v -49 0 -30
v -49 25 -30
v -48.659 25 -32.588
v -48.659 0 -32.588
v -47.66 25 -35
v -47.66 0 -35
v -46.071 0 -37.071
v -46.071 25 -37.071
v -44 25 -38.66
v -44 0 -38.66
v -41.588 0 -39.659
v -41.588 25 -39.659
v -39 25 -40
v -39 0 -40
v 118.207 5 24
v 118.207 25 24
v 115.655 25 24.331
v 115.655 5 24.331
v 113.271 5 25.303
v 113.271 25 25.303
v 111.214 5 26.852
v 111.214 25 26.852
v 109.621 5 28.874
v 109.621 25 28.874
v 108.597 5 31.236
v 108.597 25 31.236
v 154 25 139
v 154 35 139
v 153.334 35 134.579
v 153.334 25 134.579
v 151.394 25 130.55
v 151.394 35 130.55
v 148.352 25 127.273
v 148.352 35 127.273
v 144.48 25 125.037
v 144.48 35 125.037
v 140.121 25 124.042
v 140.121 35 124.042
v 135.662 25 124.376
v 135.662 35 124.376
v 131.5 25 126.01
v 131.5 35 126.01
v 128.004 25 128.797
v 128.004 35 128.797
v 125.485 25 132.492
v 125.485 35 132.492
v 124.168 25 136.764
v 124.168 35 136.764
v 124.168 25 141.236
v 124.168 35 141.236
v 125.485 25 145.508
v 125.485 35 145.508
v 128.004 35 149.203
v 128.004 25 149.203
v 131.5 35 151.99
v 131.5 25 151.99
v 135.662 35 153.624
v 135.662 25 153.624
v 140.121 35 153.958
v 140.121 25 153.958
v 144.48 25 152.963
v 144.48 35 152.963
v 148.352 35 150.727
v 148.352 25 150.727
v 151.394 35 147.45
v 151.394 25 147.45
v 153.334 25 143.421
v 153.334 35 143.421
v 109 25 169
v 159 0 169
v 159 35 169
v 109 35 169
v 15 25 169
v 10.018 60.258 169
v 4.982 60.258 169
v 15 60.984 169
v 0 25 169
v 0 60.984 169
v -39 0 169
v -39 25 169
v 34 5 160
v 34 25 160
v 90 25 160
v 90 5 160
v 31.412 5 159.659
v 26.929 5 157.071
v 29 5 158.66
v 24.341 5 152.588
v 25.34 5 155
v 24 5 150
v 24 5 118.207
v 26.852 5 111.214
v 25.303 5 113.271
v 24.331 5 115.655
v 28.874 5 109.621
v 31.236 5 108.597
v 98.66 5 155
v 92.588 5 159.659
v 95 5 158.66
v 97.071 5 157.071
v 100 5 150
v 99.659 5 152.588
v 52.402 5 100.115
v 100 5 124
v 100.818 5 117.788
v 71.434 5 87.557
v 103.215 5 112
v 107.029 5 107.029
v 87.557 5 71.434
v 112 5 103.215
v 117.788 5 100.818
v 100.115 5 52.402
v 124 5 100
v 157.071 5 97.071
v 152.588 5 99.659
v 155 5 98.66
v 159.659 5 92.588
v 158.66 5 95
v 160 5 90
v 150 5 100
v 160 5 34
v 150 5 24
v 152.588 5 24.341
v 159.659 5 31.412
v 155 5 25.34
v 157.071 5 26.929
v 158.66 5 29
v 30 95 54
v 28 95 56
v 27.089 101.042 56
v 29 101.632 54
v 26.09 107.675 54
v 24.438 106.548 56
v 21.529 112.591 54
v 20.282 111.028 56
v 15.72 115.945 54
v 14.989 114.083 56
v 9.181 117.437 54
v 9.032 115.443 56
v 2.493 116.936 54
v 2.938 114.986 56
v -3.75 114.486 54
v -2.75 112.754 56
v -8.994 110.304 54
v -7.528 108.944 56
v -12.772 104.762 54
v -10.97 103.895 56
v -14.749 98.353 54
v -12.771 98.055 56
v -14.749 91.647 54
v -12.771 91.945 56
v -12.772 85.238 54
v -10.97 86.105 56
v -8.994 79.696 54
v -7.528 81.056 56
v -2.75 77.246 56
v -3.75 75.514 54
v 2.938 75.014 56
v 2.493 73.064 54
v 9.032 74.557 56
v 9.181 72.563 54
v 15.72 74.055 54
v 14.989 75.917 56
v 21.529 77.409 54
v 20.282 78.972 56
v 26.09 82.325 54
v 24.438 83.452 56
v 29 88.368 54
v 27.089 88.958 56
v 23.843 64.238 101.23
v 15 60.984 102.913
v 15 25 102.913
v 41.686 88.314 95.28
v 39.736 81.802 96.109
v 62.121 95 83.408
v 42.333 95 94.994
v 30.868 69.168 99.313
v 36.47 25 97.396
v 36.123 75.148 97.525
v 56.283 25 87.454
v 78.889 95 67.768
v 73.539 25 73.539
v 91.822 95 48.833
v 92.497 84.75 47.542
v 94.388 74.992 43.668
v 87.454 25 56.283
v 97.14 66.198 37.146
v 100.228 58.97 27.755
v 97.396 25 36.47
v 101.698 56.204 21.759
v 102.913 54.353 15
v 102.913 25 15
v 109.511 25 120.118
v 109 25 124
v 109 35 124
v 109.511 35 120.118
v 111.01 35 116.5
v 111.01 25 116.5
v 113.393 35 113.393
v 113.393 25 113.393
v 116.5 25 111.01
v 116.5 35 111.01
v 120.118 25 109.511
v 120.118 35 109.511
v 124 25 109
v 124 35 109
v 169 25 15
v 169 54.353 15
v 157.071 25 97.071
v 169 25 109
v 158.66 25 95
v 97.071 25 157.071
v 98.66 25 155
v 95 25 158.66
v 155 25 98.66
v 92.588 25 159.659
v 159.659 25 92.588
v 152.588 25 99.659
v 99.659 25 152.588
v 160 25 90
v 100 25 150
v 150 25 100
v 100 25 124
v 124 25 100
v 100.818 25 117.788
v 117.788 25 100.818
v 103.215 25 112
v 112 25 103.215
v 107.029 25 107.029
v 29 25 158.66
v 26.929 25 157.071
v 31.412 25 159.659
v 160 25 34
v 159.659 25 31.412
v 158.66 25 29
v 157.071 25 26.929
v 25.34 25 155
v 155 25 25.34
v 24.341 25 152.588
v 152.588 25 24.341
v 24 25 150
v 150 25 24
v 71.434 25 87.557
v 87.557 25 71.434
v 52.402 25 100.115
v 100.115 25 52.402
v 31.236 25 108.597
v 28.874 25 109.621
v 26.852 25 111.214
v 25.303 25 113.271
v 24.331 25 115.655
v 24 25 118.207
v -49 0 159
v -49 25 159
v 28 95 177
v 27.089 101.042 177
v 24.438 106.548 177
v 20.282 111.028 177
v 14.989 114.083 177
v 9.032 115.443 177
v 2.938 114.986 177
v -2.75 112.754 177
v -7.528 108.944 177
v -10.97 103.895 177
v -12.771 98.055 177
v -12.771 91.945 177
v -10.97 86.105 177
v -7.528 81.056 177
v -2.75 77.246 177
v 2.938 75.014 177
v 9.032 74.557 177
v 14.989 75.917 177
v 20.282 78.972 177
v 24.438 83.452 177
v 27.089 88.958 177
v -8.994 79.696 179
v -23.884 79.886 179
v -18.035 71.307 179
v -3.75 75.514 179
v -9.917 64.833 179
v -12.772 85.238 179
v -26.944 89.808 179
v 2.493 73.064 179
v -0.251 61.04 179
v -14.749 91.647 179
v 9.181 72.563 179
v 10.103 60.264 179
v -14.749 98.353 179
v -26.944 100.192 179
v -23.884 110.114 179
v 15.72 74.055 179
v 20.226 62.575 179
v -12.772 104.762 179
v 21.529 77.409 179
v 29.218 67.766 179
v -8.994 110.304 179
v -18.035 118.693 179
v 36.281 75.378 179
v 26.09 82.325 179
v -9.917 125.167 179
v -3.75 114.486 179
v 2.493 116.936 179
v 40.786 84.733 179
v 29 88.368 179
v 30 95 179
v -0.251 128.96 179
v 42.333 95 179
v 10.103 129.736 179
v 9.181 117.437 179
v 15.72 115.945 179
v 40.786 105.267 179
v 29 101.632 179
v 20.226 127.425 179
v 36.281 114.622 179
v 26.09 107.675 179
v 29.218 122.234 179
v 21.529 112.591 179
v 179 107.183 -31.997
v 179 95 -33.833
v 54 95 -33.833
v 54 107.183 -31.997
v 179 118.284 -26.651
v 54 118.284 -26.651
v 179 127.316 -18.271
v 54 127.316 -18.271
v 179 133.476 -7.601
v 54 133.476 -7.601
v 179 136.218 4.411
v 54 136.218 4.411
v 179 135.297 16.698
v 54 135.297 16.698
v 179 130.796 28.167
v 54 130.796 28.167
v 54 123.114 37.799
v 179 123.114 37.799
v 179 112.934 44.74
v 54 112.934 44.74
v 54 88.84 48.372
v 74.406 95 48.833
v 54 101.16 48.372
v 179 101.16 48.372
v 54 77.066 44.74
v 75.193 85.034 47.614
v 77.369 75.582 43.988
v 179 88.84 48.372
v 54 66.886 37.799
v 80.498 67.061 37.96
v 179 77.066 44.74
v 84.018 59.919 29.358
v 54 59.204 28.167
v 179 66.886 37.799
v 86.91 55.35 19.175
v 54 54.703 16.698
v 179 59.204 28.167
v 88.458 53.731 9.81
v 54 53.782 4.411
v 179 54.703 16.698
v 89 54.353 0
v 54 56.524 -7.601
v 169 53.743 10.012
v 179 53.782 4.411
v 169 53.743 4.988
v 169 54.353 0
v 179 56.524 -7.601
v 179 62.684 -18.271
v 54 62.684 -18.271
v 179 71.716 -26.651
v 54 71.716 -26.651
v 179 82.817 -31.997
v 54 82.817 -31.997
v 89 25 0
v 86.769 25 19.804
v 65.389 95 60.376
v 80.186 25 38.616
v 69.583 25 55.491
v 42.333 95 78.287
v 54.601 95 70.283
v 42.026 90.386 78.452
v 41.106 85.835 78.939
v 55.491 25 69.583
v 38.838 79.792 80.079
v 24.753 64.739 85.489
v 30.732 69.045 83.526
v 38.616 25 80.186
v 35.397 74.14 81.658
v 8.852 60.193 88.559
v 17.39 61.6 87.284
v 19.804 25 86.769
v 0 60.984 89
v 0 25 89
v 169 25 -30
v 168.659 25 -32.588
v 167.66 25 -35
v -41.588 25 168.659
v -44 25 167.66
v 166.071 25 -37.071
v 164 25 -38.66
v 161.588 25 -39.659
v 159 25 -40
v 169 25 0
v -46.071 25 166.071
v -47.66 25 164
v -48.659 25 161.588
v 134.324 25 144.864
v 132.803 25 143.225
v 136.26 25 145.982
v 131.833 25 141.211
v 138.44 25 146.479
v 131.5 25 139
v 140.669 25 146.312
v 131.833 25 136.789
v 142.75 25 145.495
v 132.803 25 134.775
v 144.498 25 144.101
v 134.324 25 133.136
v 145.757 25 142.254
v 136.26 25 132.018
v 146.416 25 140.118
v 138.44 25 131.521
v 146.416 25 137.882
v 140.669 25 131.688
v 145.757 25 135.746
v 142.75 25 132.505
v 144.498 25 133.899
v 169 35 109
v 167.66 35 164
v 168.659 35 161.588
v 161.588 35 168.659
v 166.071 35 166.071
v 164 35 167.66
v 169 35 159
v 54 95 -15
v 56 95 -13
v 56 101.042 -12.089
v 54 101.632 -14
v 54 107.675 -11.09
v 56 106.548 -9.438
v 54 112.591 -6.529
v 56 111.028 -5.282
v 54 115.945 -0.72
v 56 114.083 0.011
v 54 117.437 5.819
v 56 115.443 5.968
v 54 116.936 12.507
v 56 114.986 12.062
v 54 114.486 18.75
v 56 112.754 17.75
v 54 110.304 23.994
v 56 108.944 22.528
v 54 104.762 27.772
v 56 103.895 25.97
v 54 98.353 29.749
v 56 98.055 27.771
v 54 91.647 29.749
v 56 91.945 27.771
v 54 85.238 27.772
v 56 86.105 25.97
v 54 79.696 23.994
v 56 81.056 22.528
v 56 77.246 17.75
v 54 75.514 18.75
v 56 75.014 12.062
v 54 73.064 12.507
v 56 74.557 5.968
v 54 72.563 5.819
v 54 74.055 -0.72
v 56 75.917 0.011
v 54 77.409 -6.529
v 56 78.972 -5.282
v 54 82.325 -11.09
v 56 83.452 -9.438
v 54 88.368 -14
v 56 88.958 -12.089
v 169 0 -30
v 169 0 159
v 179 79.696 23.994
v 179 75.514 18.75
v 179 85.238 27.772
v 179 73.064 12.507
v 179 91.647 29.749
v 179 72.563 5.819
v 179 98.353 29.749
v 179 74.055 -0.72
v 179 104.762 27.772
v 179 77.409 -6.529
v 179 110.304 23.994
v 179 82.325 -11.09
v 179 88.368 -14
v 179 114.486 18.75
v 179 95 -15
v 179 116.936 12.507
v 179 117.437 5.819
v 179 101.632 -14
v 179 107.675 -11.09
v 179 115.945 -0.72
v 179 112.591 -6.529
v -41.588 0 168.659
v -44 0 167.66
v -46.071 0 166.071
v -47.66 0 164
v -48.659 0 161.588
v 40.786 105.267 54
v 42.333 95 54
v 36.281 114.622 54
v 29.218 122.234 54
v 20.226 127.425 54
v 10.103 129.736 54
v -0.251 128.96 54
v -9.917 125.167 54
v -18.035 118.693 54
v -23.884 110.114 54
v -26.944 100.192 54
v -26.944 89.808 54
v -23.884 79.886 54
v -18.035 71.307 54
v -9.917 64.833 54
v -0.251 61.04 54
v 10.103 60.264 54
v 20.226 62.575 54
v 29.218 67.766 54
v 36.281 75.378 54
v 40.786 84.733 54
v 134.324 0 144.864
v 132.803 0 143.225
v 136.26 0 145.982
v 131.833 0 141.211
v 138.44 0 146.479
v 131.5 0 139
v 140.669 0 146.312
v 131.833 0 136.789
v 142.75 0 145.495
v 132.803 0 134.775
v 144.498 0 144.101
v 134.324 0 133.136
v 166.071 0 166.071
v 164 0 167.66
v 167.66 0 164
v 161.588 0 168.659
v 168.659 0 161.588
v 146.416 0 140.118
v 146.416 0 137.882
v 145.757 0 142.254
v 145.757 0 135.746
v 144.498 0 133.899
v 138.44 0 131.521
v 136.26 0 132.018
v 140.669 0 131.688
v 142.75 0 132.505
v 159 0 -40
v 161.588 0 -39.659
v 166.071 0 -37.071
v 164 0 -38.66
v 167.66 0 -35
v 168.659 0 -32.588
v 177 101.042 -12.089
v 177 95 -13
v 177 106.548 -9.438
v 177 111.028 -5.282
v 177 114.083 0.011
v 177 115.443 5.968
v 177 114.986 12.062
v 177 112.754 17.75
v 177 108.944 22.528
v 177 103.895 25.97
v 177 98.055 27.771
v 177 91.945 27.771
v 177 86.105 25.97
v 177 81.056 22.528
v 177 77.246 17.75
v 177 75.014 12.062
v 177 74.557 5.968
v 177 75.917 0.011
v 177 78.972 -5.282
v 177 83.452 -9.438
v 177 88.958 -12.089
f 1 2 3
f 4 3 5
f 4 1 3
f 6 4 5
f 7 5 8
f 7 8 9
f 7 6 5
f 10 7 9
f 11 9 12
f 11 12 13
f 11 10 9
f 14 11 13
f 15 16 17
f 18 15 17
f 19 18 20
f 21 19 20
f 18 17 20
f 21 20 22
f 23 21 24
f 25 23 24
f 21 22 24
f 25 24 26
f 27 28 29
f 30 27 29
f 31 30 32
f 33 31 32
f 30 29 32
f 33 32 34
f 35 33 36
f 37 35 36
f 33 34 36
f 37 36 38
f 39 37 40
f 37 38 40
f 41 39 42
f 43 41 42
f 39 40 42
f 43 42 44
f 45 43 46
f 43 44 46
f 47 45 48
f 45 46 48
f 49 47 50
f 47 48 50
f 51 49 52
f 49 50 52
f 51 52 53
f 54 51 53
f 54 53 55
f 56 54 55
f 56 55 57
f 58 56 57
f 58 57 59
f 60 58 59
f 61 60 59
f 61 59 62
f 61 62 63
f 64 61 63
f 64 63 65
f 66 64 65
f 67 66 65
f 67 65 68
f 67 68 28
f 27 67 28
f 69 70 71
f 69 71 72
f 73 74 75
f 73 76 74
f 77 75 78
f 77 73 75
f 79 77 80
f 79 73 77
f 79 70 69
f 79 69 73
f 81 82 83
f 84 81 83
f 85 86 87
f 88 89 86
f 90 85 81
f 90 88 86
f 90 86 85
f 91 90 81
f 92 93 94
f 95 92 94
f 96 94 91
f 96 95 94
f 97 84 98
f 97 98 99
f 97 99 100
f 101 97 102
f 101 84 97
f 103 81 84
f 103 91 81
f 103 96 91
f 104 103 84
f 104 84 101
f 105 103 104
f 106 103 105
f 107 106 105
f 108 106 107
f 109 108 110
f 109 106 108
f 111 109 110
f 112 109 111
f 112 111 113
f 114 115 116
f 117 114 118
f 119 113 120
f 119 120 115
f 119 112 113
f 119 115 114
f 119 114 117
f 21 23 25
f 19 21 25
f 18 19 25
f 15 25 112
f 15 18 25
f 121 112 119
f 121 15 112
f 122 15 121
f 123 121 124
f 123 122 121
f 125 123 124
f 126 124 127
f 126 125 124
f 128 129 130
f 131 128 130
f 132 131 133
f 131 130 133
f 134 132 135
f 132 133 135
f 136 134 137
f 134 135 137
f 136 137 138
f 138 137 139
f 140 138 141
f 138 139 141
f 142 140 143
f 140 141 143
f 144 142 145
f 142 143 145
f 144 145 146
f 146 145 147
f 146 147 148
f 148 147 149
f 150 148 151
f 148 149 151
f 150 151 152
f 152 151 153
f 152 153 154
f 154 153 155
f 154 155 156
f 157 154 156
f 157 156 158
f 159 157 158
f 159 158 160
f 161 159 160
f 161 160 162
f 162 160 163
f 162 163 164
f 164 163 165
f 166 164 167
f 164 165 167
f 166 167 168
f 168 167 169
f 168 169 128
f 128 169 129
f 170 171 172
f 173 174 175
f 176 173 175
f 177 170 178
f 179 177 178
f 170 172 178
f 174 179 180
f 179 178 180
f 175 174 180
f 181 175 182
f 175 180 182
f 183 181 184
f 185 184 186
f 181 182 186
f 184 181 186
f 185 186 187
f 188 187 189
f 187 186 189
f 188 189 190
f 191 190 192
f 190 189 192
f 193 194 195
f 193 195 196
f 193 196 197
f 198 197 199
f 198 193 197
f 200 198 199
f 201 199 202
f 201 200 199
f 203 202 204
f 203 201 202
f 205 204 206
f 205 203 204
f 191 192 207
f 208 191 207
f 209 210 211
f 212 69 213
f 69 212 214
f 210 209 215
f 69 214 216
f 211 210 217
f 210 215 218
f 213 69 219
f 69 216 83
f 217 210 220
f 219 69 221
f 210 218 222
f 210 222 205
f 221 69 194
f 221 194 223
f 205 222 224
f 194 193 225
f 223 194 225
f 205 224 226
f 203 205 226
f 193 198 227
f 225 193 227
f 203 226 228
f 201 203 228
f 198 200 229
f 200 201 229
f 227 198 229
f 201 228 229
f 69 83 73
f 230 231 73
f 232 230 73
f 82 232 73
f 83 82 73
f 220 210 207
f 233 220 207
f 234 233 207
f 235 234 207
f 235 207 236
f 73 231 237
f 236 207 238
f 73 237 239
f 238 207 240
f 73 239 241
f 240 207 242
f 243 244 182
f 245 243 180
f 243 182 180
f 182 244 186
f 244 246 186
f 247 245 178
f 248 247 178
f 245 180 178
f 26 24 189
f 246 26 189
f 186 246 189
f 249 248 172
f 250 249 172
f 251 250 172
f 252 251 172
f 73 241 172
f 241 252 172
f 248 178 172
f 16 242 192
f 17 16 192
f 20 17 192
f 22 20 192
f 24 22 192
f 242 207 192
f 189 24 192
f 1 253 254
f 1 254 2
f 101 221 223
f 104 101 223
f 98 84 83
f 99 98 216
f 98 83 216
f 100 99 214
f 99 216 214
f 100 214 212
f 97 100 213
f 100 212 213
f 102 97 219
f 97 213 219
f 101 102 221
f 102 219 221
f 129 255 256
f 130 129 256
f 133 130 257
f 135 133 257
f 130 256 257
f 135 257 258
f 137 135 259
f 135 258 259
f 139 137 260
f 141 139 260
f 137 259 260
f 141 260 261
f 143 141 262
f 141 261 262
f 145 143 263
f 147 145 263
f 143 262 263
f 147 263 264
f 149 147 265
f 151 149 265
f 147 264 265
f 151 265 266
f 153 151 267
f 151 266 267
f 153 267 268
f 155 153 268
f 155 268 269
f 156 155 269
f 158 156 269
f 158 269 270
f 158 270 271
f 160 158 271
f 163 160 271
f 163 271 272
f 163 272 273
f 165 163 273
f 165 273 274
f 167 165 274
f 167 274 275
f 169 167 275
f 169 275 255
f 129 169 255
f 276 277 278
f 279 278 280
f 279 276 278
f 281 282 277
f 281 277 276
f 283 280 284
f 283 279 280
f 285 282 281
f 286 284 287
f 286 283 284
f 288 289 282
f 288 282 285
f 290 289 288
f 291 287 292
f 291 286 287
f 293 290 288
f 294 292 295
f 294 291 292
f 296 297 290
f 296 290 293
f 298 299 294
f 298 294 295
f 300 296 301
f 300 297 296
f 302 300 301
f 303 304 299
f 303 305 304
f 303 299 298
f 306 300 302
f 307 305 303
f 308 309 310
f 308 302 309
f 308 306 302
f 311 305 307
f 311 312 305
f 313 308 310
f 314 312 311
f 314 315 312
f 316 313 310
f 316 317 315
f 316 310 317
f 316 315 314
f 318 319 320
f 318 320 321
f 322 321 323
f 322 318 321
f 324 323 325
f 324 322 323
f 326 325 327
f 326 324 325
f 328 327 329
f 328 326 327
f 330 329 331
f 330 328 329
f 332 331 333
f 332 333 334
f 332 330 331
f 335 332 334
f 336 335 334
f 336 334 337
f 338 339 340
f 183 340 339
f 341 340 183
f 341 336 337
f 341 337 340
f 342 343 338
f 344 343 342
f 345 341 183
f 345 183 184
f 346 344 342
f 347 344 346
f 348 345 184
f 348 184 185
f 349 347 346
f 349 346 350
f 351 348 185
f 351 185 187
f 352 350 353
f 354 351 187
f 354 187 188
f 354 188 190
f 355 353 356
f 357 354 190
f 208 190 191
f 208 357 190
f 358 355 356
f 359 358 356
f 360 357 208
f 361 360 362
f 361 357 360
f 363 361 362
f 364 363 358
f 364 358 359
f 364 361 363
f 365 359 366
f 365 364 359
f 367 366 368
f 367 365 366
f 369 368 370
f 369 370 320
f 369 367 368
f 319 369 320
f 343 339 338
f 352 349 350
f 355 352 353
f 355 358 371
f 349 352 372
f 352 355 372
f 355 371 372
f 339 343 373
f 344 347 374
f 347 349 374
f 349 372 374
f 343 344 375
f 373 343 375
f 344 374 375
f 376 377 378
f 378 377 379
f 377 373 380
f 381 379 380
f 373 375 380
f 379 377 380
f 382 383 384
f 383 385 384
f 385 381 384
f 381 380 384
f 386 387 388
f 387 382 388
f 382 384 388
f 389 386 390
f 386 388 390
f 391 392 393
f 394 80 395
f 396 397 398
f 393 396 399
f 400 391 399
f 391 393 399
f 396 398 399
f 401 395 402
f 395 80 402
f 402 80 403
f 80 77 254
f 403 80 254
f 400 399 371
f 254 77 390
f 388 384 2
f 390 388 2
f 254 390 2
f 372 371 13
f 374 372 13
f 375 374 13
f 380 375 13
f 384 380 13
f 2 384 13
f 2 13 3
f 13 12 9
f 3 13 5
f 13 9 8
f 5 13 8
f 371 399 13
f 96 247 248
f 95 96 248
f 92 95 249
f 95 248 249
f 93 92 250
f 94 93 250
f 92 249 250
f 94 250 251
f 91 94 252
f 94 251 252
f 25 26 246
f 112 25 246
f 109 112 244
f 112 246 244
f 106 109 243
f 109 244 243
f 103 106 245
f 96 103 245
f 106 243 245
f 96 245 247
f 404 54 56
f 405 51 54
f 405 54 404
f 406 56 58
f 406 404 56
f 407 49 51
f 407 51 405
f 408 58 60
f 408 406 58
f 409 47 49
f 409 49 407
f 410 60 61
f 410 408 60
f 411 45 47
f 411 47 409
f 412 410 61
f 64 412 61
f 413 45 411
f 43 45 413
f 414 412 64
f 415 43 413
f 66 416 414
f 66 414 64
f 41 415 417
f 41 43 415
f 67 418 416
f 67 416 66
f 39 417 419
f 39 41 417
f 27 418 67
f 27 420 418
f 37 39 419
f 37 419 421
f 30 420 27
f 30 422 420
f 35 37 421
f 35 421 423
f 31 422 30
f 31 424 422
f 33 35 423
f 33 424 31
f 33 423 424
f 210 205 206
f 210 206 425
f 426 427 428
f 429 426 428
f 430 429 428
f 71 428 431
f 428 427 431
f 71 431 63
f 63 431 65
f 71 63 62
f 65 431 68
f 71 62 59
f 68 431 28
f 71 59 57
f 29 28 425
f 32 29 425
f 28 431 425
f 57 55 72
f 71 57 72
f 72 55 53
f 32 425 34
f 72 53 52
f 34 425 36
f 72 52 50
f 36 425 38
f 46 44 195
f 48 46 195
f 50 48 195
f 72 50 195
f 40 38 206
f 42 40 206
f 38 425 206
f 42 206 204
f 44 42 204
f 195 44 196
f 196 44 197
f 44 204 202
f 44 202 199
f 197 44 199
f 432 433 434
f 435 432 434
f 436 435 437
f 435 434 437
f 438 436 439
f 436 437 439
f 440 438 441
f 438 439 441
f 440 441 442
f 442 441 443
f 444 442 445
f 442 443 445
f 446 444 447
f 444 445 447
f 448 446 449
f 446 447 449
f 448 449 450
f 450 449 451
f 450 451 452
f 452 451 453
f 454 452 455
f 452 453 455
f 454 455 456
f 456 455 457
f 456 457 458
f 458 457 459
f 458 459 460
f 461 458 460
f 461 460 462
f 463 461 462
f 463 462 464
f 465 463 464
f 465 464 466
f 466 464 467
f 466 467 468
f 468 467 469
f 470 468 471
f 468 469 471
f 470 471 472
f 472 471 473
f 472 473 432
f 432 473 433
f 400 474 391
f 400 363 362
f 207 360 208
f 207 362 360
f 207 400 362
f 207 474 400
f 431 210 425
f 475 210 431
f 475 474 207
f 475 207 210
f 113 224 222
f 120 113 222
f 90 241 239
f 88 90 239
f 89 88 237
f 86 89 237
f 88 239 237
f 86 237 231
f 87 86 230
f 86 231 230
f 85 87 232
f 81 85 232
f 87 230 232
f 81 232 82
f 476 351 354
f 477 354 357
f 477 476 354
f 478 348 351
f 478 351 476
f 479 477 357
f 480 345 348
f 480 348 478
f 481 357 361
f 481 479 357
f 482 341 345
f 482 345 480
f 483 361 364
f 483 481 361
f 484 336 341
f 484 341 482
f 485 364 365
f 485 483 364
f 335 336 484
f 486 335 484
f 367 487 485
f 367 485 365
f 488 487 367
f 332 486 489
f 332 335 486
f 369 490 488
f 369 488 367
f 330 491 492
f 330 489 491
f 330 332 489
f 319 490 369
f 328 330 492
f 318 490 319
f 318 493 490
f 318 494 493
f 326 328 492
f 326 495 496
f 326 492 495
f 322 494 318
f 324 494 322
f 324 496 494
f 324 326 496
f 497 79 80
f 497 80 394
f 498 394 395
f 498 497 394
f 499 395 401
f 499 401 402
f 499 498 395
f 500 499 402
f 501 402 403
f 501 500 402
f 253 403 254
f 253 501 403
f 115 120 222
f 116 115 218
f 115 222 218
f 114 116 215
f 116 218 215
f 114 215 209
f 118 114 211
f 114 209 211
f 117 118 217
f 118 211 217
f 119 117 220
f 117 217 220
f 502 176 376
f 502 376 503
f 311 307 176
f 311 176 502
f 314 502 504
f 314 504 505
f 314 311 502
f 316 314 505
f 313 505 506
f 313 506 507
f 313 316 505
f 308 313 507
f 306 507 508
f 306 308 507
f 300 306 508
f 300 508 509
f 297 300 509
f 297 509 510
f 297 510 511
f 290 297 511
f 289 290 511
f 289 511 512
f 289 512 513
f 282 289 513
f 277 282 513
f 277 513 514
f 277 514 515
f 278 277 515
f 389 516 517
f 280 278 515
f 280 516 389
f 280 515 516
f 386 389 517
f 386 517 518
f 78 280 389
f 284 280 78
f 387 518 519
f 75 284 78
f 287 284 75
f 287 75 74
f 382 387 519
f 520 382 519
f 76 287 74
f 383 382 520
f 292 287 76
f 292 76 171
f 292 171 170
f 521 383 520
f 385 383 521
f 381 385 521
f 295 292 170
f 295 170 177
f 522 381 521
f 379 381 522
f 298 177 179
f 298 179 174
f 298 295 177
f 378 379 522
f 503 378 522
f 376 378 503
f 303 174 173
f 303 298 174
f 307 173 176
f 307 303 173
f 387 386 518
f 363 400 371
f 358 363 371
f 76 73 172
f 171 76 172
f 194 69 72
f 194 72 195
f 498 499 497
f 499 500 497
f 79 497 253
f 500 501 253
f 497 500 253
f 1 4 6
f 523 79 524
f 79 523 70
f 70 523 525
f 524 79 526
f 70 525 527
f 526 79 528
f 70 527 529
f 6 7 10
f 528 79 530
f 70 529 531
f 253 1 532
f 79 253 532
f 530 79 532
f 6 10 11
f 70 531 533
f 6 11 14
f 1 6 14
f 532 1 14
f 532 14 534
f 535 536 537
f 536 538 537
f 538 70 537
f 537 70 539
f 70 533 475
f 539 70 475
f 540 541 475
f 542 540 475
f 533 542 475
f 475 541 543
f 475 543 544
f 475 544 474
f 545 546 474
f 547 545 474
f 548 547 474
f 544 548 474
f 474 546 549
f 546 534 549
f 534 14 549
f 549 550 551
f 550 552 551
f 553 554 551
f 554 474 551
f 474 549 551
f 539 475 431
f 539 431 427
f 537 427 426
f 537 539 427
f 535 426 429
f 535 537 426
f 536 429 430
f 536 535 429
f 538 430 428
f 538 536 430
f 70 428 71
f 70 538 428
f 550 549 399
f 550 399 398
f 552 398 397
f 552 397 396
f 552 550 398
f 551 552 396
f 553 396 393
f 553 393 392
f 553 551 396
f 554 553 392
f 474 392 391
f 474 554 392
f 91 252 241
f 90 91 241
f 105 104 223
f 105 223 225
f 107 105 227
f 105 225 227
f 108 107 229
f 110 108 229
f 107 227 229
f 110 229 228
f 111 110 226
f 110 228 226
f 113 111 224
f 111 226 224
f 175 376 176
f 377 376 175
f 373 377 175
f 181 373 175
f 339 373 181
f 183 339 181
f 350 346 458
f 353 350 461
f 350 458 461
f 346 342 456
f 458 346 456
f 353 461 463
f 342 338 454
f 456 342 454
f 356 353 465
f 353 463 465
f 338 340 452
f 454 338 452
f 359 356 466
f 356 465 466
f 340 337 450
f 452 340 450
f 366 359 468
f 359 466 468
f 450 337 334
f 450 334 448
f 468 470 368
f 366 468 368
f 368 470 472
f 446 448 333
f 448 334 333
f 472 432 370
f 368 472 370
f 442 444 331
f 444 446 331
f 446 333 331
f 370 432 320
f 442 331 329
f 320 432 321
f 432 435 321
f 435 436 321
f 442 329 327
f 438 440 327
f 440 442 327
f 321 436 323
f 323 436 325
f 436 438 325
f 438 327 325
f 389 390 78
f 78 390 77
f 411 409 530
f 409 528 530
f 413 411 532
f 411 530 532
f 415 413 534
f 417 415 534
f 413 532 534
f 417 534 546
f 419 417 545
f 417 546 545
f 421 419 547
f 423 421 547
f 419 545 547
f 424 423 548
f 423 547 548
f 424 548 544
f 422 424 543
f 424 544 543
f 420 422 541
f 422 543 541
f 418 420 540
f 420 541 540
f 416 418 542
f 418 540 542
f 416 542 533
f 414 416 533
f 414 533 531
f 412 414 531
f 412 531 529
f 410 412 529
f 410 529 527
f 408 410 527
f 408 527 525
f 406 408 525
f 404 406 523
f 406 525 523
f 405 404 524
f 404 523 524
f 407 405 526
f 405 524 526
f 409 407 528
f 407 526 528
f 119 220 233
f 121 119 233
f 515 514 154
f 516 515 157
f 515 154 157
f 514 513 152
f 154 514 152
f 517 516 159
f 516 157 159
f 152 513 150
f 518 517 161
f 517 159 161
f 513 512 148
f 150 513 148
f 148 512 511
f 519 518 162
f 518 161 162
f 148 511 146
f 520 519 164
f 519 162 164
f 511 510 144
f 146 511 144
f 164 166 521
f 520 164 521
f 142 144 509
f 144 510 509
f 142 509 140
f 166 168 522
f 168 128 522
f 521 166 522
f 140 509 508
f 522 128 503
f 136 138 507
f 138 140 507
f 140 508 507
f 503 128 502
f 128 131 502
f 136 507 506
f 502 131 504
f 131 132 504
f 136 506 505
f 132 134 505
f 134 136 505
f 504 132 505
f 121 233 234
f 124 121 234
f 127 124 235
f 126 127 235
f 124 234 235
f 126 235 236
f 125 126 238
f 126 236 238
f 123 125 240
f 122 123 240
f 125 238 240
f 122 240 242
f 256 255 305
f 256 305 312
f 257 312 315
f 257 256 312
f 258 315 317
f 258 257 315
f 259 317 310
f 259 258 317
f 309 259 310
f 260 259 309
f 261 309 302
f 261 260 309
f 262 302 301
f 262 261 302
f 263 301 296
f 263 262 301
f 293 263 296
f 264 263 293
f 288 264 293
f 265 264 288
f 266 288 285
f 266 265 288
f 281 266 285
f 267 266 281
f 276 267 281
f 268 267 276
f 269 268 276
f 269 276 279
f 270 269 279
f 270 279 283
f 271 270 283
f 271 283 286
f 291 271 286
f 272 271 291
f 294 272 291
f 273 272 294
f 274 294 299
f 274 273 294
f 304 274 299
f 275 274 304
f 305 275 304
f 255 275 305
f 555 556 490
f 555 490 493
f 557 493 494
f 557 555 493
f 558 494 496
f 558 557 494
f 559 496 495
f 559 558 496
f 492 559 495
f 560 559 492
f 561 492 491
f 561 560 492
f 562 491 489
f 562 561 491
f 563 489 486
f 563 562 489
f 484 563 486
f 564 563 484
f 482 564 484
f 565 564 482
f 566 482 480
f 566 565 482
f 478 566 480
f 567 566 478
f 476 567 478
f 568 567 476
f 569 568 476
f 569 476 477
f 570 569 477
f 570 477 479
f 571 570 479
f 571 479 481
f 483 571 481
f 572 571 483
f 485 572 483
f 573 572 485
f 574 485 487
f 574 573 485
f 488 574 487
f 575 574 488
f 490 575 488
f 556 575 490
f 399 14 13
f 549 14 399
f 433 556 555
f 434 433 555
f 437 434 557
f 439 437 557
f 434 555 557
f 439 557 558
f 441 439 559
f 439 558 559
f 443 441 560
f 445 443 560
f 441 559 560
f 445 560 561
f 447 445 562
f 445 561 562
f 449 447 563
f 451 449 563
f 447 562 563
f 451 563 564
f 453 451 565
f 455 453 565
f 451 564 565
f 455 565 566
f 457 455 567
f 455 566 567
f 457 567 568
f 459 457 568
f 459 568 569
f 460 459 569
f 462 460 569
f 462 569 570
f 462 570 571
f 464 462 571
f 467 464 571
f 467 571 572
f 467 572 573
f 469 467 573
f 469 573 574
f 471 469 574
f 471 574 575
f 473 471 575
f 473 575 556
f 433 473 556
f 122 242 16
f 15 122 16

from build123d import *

# Parameters (mm, degrees)
BOSS_EXTRUDE1_DEPTH                     = 25
BOSS_EXTRUDE2_START                     = -25
BOSS_EXTRUDE2_DEPTH                     = 95
BOSS_EXTRUDE3_DEPTH                     = 10
CBORE_FOR_M8_HEX_HEAD_BOLT1_D           = 15
CBORE_FOR_M8_HEX_HEAD_BOLT1_CBORE_D     = 30
CBORE_FOR_M8_HEX_HEAD_BOLT1_CBORE_DEPTH = 10
CUT_EXTRUDE1_DEPTH                      = 20
BOSS_EXTRUDE4_START                     = 10
SKETCH7_R                               = 34.833333333
BOSS_EXTRUDE4_DEPTH                     = 125
BOSS_EXTRUDE5_START                     = 10
SKETCH8_R                               = 41.333333333
BOSS_EXTRUDE5_DEPTH                     = 125
CUT_EXTRUDE2_REACH                      = 315.988
SKETCH9_R                               = 20.5
CUT_EXTRUDE3_REACH                      = 322.331
SKETCH10_R                              = 20.5
CHAMFER1_SIZE                           = 2


with BuildPart() as part:
    # Sketch1 → Boss-Extrude1 (new body)
    with BuildSketch(Plane(origin=(0, 0, 0), x_dir=(1, 0, 0), z_dir=(0, 1, 0))):
        with BuildLine():
            Line((-39, 40), (159, 40))
            ThreePointArc((159, 40), (166.071067812, 37.071067812), (169, 30))
            Line((169, 30), (169, -159))
            ThreePointArc((169, -159), (166.071067812, -166.071067812), (159, -169))
            Line((159, -169), (-39, -169))
            ThreePointArc((-39, -169), (-46.071067812, -166.071067812), (-49, -159))
            Line((-49, -159), (-49, 30))
            ThreePointArc((-49, 30), (-46.071067812, 37.071067812), (-39, 40))
        make_face()
    extrude(amount=BOSS_EXTRUDE1_DEPTH)

    # Sketch2 → Boss-Extrude2 (add)
    with BuildSketch(Plane(origin=(0, 25, 0), x_dir=(1, 0, 0), z_dir=(0, 1, 0)).offset(BOSS_EXTRUDE2_START)):
        with BuildLine():
            Line((0, -89), (0, -169))
            Line((0, -169), (15, -169))
            Line((15, -169), (15, -102.912584265))
            ThreePointArc((15, -102.912584265), (73.539105243, -73.539105243), (102.912584265, -15))
            Line((102.912584265, -15), (169, -15))
            Line((169, -15), (169, 0))
            Line((169, 0), (89, 0))
            ThreePointArc((89, 0), (62.932503526, -62.932503526), (0, -89))
        make_face()
    extrude(amount=BOSS_EXTRUDE2_DEPTH)

    # Sketch3 → Boss-Extrude3 (add)
    with BuildSketch(Plane(origin=(0, 25, 0), x_dir=(1, 0, 0), z_dir=(0, 1, 0))):
        with BuildLine():
            Line((124, -109), (169, -109))
            Line((169, -109), (169, -159))
            ThreePointArc((169, -159), (166.071067812, -166.071067812), (159, -169))
            Line((159, -169), (109, -169))
            Line((109, -169), (109, -124))
            ThreePointArc((109, -124), (113.393398282, -113.393398282), (124, -109))
        make_face()
    extrude(amount=BOSS_EXTRUDE3_DEPTH)

    # CBORE for M8 Hex Head Bolt1 (through all)
    with Locations(Plane(origin=(0, 35, 0), x_dir=(1, 0, 0), z_dir=(0, 1, 0))):
        with Locations((139, -139)):
            CounterBoreHole(CBORE_FOR_M8_HEX_HEAD_BOLT1_D / 2, CBORE_FOR_M8_HEX_HEAD_BOLT1_CBORE_D / 2, CBORE_FOR_M8_HEX_HEAD_BOLT1_CBORE_DEPTH)

    # Sketch6 → Cut-Extrude1 (cut)
    with BuildSketch(Plane(origin=(0, 25, 0), x_dir=(1, 0, 0), z_dir=(0, 1, 0))):
        with BuildLine():
            Line((100, -150), (100, -124))
            ThreePointArc((100, -124), (107.029437252, -107.029437252), (124, -100))
            Line((124, -100), (150, -100))
            ThreePointArc((150, -100), (157.071067812, -97.071067812), (160, -90))
            Line((160, -90), (160, -34))
            ThreePointArc((160, -34), (157.071067812, -26.928932188), (150, -24))
            Line((150, -24), (118.207444774, -24))
            ThreePointArc((118.207444774, -24), (112.192558093, -26.011186683), (108.59708341, -31.235772358))
            ThreePointArc((108.59708341, -31.235772358), (79.903066274, -79.903066274), (31.235772358, -108.59708341))
            ThreePointArc((31.235772358, -108.59708341), (26.011186683, -112.192558093), (24, -118.207444774))
            Line((24, -118.207444774), (24, -150))
            ThreePointArc((24, -150), (26.928932188, -157.071067812), (34, -160))
            Line((34, -160), (90, -160))
            ThreePointArc((90, -160), (97.071067812, -157.071067812), (100, -150))
        make_face()
    extrude(amount=-CUT_EXTRUDE1_DEPTH, mode=Mode.SUBTRACT)

    # Sketch7 → Boss-Extrude4 (add)
    with BuildSketch(Plane.XY.offset(169).offset(BOSS_EXTRUDE4_START)):
        with Locations((7.5, 95)):
            Circle(SKETCH7_R)
    extrude(amount=-BOSS_EXTRUDE4_DEPTH)

    # Sketch8 → Boss-Extrude5 (add)
    with BuildSketch(Plane(origin=(169, 0, 0), x_dir=(0, 0, -1), z_dir=(1, 0, 0)).offset(BOSS_EXTRUDE5_START)):
        with Locations((-7.5, 95)):
            Circle(SKETCH8_R)
    extrude(amount=-BOSS_EXTRUDE5_DEPTH)

    # Sketch9 → Cut-Extrude2 (cut, up to next)
    with BuildSketch(Plane.XY.offset(179), mode=Mode.PRIVATE) as cut_extrude2_sk1:
        with Locations((7.5, 95)):
            Circle(SKETCH9_R)
    cut_extrude2_tool1 = extrude(cut_extrude2_sk1.sketch, amount=-CUT_EXTRUDE2_REACH, mode=Mode.PRIVATE) & part.part
    add(cut_extrude2_tool1.solids().sort_by_distance((7.5, 95, 179))[0], mode=Mode.SUBTRACT)

    # Sketch10 → Cut-Extrude3 (cut, up to next)
    with BuildSketch(Plane(origin=(179, 0, 0), x_dir=(0, 0, -1), z_dir=(1, 0, 0)), mode=Mode.PRIVATE) as cut_extrude3_sk1:
        with Locations((-7.5, 95)):
            Circle(SKETCH10_R)
    cut_extrude3_tool1 = extrude(cut_extrude3_sk1.sketch, amount=-CUT_EXTRUDE3_REACH, mode=Mode.PRIVATE) & part.part
    add(cut_extrude3_tool1.solids().sort_by_distance((179, 95, 7.5))[0], mode=Mode.SUBTRACT)

    # Chamfer1
    chamfer1_edges = [part.edges().sort_by_distance(p)[0] for p in [
        (-13, 95, 179),
        (-13, 95, 54),
        (179, 95, 28),
        (54, 95, 28),
    ]]
    chamfer(chamfer1_edges, length=CHAMFER1_SIZE)


solid = part.part
